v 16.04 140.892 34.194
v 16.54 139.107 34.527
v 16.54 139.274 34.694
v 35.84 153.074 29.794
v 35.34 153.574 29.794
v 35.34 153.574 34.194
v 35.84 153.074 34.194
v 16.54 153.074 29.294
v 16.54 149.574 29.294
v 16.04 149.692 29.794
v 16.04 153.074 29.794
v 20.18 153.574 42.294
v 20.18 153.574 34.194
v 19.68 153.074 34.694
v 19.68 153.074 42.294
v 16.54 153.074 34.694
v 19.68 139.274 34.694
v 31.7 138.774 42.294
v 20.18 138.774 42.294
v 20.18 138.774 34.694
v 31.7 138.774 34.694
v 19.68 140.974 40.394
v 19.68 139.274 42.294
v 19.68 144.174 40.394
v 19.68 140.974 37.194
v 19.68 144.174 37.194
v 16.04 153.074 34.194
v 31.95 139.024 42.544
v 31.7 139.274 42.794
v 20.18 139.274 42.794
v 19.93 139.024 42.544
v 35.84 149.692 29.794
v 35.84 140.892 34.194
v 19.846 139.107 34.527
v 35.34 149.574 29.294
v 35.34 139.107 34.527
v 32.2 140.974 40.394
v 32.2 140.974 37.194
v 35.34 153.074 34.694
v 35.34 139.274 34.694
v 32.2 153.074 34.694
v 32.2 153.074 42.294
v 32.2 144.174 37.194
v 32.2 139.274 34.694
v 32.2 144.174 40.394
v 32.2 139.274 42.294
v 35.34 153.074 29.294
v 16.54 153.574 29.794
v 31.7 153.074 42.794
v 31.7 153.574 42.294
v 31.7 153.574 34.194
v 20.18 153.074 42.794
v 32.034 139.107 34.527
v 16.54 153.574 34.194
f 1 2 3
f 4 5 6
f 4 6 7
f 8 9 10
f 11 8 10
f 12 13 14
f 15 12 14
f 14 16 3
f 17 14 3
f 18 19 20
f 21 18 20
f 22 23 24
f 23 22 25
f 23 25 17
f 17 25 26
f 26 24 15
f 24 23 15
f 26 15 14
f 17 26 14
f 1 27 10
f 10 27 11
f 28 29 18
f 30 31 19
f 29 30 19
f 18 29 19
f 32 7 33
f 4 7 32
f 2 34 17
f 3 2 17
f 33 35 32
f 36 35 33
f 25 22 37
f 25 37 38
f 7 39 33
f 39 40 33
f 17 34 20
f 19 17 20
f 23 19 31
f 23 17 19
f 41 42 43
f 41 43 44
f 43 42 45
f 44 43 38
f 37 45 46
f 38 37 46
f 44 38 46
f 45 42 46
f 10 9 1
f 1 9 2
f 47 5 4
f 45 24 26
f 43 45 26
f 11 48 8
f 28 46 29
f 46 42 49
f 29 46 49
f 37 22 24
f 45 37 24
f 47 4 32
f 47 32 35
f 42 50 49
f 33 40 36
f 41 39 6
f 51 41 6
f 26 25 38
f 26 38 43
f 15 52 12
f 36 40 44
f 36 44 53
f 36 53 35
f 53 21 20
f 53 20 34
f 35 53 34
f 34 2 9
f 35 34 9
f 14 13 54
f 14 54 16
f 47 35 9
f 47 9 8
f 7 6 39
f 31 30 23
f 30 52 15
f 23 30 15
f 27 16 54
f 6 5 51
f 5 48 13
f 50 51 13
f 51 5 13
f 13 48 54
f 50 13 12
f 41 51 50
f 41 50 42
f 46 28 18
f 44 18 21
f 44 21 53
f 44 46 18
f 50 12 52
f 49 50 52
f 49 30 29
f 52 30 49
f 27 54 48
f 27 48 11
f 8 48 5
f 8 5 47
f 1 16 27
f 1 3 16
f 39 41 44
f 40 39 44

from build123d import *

# Parameters (mm, degrees)
BOSS_EXTRUDE1_DEPTH      = 6.260392
BOSS_EXTRUDE1_DEPTH_BACK = 6.260392
SKETCH4_W                = 8.1
SKETCH4_H                = 14.8
SKETCH4_W_2              = 3.2
SKETCH4_H_2              = 3.2
BOSS_EXTRUDE2_DEPTH      = 9.9
BOSS_EXTRUDE2_DEPTH_BACK = 9.9
CHAMFER2_SIZE            = 0.5


with BuildPart() as part:
    # Sketch4 → Boss-Extrude1 (new, two sides: drawn at the far end of the back side and taken through both)
    with BuildSketch(Plane(origin=(25.940071358, 0, 0), x_dir=(0, 0, -1), z_dir=(1, 0, 0)).offset(-BOSS_EXTRUDE1_DEPTH_BACK)):
        with Locations((-38.743556796, 146.174028513)):
            Rectangle(SKETCH4_W, SKETCH4_H)
        with Locations((-38.793556796, 142.574028513)):
            Rectangle(SKETCH4_W_2, SKETCH4_H_2, mode=Mode.SUBTRACT)
    extrude(amount=BOSS_EXTRUDE1_DEPTH + BOSS_EXTRUDE1_DEPTH_BACK)

    # Sketch4<5> → Boss-Extrude2 (add, two sides: drawn at the far end of the back side and taken through both)
    with BuildSketch(Plane(origin=(25.940071358, 0, 0), x_dir=(0, 0, -1), z_dir=(1, 0, 0)).offset(-BOSS_EXTRUDE2_DEPTH_BACK)):
        Polygon((-34.693556796, 153.574028513), (-34.693556796, 138.774028513), (-29.293556796, 149.574028513), (-29.293556796, 153.574028513), align=None)
    extrude(amount=BOSS_EXTRUDE2_DEPTH + BOSS_EXTRUDE2_DEPTH_BACK)

    # Chamfer1
    # the kernel refuses this chamfer: 0.5, 0.372677996 mm, written as the material it takes off along each edge
    with BuildSketch(Plane(origin=(31.867130024, 153.240695179, 42.460223463), x_dir=(0, 0.7071067811865475, -0.7071067811865475), z_dir=(0.5773502691896258, 0.5773502691896258, 0.5773502691896258)), Plane(origin=(35.506738024, 153.240695179, 34.360223463), x_dir=(0, 0.7071067811865475, -0.7071067811865475), z_dir=(0.5773502691896258, 0.5773502691896258, 0.5773502691896258)), Plane(origin=(16.373404691, 153.240695179, 34.360223463), x_dir=(0, -0.7071067811865475, 0.7071067811865475), z_dir=(-0.5773502691896258, 0.5773502691896258, 0.5773502691896258))) as chamfer1_piece_1:
        Polygon((-0.353553391, 0.204124145), (0.353553391, 0.204124145), (0, -0.40824829), align=None)
    extrude(amount=0.635085296, mode=Mode.SUBTRACT)
    with BuildSketch(Plane(origin=(20.013012691, 153.240695179, 42.460223463), x_dir=(0, 0.7071067811865475, -0.7071067811865475), z_dir=(-0.5773502691896258, 0.5773502691896258, 0.5773502691896258)), Plane(origin=(35.506738024, 153.240695179, 29.62689013), x_dir=(0.7071067811865475, -0.7071067811865475, 0), z_dir=(0.5773502691896258, 0.5773502691896258, -0.5773502691896258)), Plane(origin=(16.373404691, 153.240695179, 29.62689013), x_dir=(0, -0.7071067811865475, -0.7071067811865475), z_dir=(-0.5773502691896258, 0.5773502691896258, -0.5773502691896258))) as chamfer1_piece_2:
        Polygon((-0.353553391, -0.204124145), (0.353553391, -0.204124145), (0, 0.40824829), align=None)
    extrude(amount=0.635085296, mode=Mode.SUBTRACT)
    with BuildSketch(Plane(origin=(35.506738024, 139.75781762, 34.471334574), x_dir=(0, -0.7071067811865777, -0.7071067811865174), z_dir=(0.9485360198619486, -0.223918979794528, 0.22391897979454709))) as chamfer1_piece_3:
        Polygon((0.184955718, -0.526311482), (0.420657979, -0.526311482), (-0.605613697, 1.052622965), align=None)
    extrude(amount=0.64485025, mode=Mode.SUBTRACT)
    with BuildSketch(Plane(origin=(16.373404691, 139.75781762, 34.471334574), x_dir=(0, 0.7071067811865777, 0.7071067811865174), z_dir=(-0.9485360198619486, -0.223918979794528, 0.22391897979454709))) as chamfer1_piece_4:
        Polygon((-0.420657979, -0.526311482), (-0.184955718, -0.526311482), (0.605613697, 1.052622965), align=None)
    extrude(amount=0.64485025, mode=Mode.SUBTRACT)
    with BuildSketch(Plane(origin=(18.393837864, 138.774028513, 42.793556796), x_dir=(0, 0.999621916911297, 0.027495876610582292), z_dir=(1, 0, 0))) as chamfer1_piece_5:
        with BuildLine():
            Line((0.514336598, 0), (-0.028273577, -0.513558897))
            Line((-0.028273577, -0.513558897), (-0.038269797, -0.513283938))
            ThreePointArc((-0.038269797, -0.513283938), (-0.017064614, -0.256698915), (-0.009996219, 0.000274959))
            Line((-0.009996219, 0.000274959), (0.000274959, 0.009996219))
            ThreePointArc((0.000274959, 0.009996219), (0.257248832, 0.002927825), (0.514611556, 0.009996219))
            Line((0.514611556, 0.009996219), (0.514336598, 0))
        make_face()
    extrude(amount=15.092466988, mode=Mode.SUBTRACT)
    with BuildSketch(Plane(origin=(33.486304852, 153.574028513, 42.793556796), x_dir=(0, 0.02749587661058229, -0.9996219169112968), z_dir=(-1, 0, 0))) as chamfer1_piece_6:
        with BuildLine():
            Line((0.514336598, 0), (-0.028273577, 0.513558897))
            Line((-0.028273577, 0.513558897), (-0.038269797, 0.513283938))
            ThreePointArc((-0.038269797, 0.513283938), (-0.017064614, 0.256698915), (-0.009996219, -0.000274959))
            Line((-0.009996219, -0.000274959), (0.000274959, -0.009996219))
            ThreePointArc((0.000274959, -0.009996219), (0.257248832, -0.002927825), (0.514611556, -0.009996219))
            Line((0.514611556, -0.009996219), (0.514336598, 0))
        make_face()
    extrude(amount=15.092466988, mode=Mode.SUBTRACT)
    with BuildSketch(Plane(origin=(32.200463358, 154.859870007, 42.793556796), x_dir=(0.02749587661058229, 0, -0.9996219169112968), z_dir=(0, -1, 0)), Plane(origin=(19.679679358, 154.859870007, 42.793556796), x_dir=(0.999621916911297, 0, 0.027495876610582105), z_dir=(0, -1, 0)), Plane(origin=(16.040071358, 154.859870007, 34.693556796), x_dir=(0.999621916911297, 0, 0.027495876610582105), z_dir=(0, -1, 0))) as chamfer1_piece_7:
        with BuildLine():
            Line((0.514336598, 0), (-0.028273577, -0.513558897))
            Line((-0.028273577, -0.513558897), (-0.038269797, -0.513283938))
            ThreePointArc((-0.038269797, -0.513283938), (-0.017064614, -0.256698915), (-0.009996219, 0.000274959))
            Line((-0.009996219, 0.000274959), (0.000274959, 0.009996219))
            ThreePointArc((0.000274959, 0.009996219), (0.257248832, 0.002927825), (0.514611556, 0.009996219))
            Line((0.514611556, 0.009996219), (0.514336598, 0))
        make_face()
    extrude(amount=17.371682988, mode=Mode.SUBTRACT)
    with BuildSketch(Plane(origin=(32.200463358, 153.574028513, 34.693556796), x_dir=(-0.999621916911297, 0.027495876610582105, 0), z_dir=(0, 0, 1))) as chamfer1_piece_8:
        with BuildLine():
            Line((0.514336598, 0), (-0.028273577, 0.513558897))
            Line((-0.028273577, 0.513558897), (-0.038269797, 0.513283938))
            ThreePointArc((-0.038269797, 0.513283938), (-0.017064614, 0.256698915), (-0.009996219, -0.000274959))
            Line((-0.009996219, -0.000274959), (0.000274959, -0.009996219))
            ThreePointArc((0.000274959, -0.009996219), (0.257248832, -0.002927825), (0.514611556, -0.009996219))
            Line((0.514611556, -0.009996219), (0.514336598, 0))
        make_face()
    extrude(amount=9.385841494, mode=Mode.SUBTRACT)
    with BuildSketch(Plane(origin=(19.679679358, 153.574028513, 34.693556796), x_dir=(0.999621916911297, 0.027495876610582105, 0), z_dir=(0, 0, 1))) as chamfer1_piece_9:
        with BuildLine():
            Line((0.514336598, 0), (-0.028273577, -0.513558897))
            Line((-0.028273577, -0.513558897), (-0.038269797, -0.513283938))
            ThreePointArc((-0.038269797, -0.513283938), (-0.017064614, -0.256698915), (-0.009996219, 0.000274959))
            Line((-0.009996219, 0.000274959), (0.000274959, 0.009996219))
            ThreePointArc((0.000274959, 0.009996219), (0.257248832, 0.002927825), (0.514611556, 0.009996219))
            Line((0.514611556, 0.009996219), (0.514336598, 0))
        make_face()
    extrude(amount=9.385841494, mode=Mode.SUBTRACT)
    with BuildSketch(Plane(origin=(37.125912852, 153.574028513, 34.693556796), x_dir=(0, -0.999621916911297, 0.027495876610582292), z_dir=(-1, 0, 0))) as chamfer1_piece_10:
        with BuildLine():
            Line((0.514336598, 0), (-0.028273577, -0.513558897))
            Line((-0.028273577, -0.513558897), (-0.038269797, -0.513283938))
            ThreePointArc((-0.038269797, -0.513283938), (-0.017064614, -0.256698915), (-0.009996219, 0.000274959))
            Line((-0.009996219, 0.000274959), (0.000274959, 0.009996219))
            ThreePointArc((0.000274959, 0.009996219), (0.257248832, 0.002927825), (0.514611556, 0.009996219))
            Line((0.514611556, 0.009996219), (0.514336598, 0))
        make_face()
    extrude(amount=4.925449494, mode=Mode.SUBTRACT)
    with BuildSketch(Plane(origin=(35.840071358, 153.574028513, 28.007715302), x_dir=(-0.999621916911297, 0.027495876610582292, 0), z_dir=(0, 0, 1))) as chamfer1_piece_11:
        with BuildLine():
            Line((0.514336598, 0), (-0.028273577, 0.513558897))
            Line((-0.028273577, 0.513558897), (-0.038269797, 0.513283938))
            ThreePointArc((-0.038269797, 0.513283938), (-0.017064614, 0.256698915), (-0.009996219, -0.000274959))
            Line((-0.009996219, -0.000274959), (0.000274959, -0.009996219))
            ThreePointArc((0.000274959, -0.009996219), (0.257248832, -0.002927825), (0.514611556, -0.009996219))
            Line((0.514611556, -0.009996219), (0.514336598, 0))
        make_face()
    extrude(amount=7.971682988, mode=Mode.SUBTRACT)
    with BuildSketch(Plane(origin=(37.125912852, 153.574028513, 29.293556796), x_dir=(0, 0.027495876610582105, 0.999621916911297), z_dir=(-1, 0, 0))) as chamfer1_piece_12:
        with BuildLine():
            Line((0.514336598, 0), (-0.028273577, -0.513558897))
            Line((-0.028273577, -0.513558897), (-0.038269797, -0.513283938))
            ThreePointArc((-0.038269797, -0.513283938), (-0.017064614, -0.256698915), (-0.009996219, 0.000274959))
            Line((-0.009996219, 0.000274959), (0.000274959, 0.009996219))
            ThreePointArc((0.000274959, 0.009996219), (0.257248832, 0.002927825), (0.514611556, 0.009996219))
            Line((0.514611556, 0.009996219), (0.514336598, 0))
        make_face()
    extrude(amount=22.371682988, mode=Mode.SUBTRACT)
    with BuildSketch(Plane(origin=(16.040071358, 153.574028513, 28.007715302), x_dir=(0.999621916911297, 0.027495876610582105, 0), z_dir=(0, 0, 1))) as chamfer1_piece_13:
        with BuildLine():
            Line((0.514336598, 0), (-0.028273577, -0.513558897))
            Line((-0.028273577, -0.513558897), (-0.038269797, -0.513283938))
            ThreePointArc((-0.038269797, -0.513283938), (-0.017064614, -0.256698915), (-0.009996219, 0.000274959))
            Line((-0.009996219, 0.000274959), (0.000274959, 0.009996219))
            ThreePointArc((0.000274959, 0.009996219), (0.257248832, 0.002927825), (0.514611556, 0.009996219))
            Line((0.514611556, 0.009996219), (0.514336598, 0))
        make_face()
    extrude(amount=7.971682988, mode=Mode.SUBTRACT)
    with BuildSketch(Plane(origin=(35.840071358, 148.288187019, 29.293556796), x_dir=(0.027495876610582105, 0, 0.999621916911297), z_dir=(0, 1, 0)), Plane(origin=(16.040071358, 148.288187019, 29.293556796), x_dir=(0.9996219169112968, 0, -0.027495876610589005), z_dir=(0, 1, 0))) as chamfer1_piece_14:
        with BuildLine():
            Line((0.514336598, 0), (-0.028273577, -0.513558897))
            Line((-0.028273577, -0.513558897), (-0.038269797, -0.513283938))
            ThreePointArc((-0.038269797, -0.513283938), (-0.017064614, -0.256698915), (-0.009996219, 0.000274959))
            Line((-0.009996219, 0.000274959), (0.000274959, 0.009996219))
            ThreePointArc((0.000274959, 0.009996219), (0.257248832, 0.002927825), (0.514611556, 0.009996219))
            Line((0.514611556, 0.009996219), (0.514336598, 0))
        make_face()
    extrude(amount=6.571682988, mode=Mode.SUBTRACT)
    with BuildSketch(Plane(origin=(35.840071358, 137.623936917, 35.268602594), x_dir=(-0.999621916911297, -0.012296529840442863, -0.024593059680883298), z_dir=(0, 0.8944271909998982, -0.44721359549999323))) as chamfer1_piece_15:
        with BuildLine():
            Line((0.514336598, 0), (-0.028273577, 0.513558897))
            Line((-0.028273577, 0.513558897), (-0.038269797, 0.513283938))
            ThreePointArc((-0.038269797, 0.513283938), (-0.017064614, 0.256698915), (-0.009996219, -0.000274959))
            Line((-0.009996219, -0.000274959), (0.000274959, -0.009996219))
            ThreePointArc((0.000274959, -0.009996219), (0.257248832, -0.002927825), (0.514611556, -0.009996219))
            Line((0.514611556, -0.009996219), (0.514336598, 0))
        make_face()
    extrude(amount=14.646450066, mode=Mode.SUBTRACT)
    with BuildSketch(Plane(origin=(16.040071358, 137.623936917, 35.268602594), x_dir=(0.999621916911297, -0.012296529840442778, -0.024593059680883128), z_dir=(0, 0.8944271909998982, -0.44721359549999323))) as chamfer1_piece_16:
        with BuildLine():
            Line((0.514336598, 0), (-0.028273577, -0.513558897))
            Line((-0.028273577, -0.513558897), (-0.038269797, -0.513283938))
            ThreePointArc((-0.038269797, -0.513283938), (-0.017064614, -0.256698915), (-0.009996219, 0.000274959))
            Line((-0.009996219, 0.000274959), (0.000274959, 0.009996219))
            ThreePointArc((0.000274959, 0.009996219), (0.257248832, 0.002927825), (0.514611556, 0.009996219))
            Line((0.514611556, 0.009996219), (0.514336598, 0))
        make_face()
    extrude(amount=14.646450066, mode=Mode.SUBTRACT)
    with BuildSketch(Plane(origin=(19.679679358, 153.574028513, 34.693556796), x_dir=(0, 0.02749587661058229, -0.9996219169112968), z_dir=(-1, 0, 0))) as chamfer1_piece_17:
        with BuildLine():
            Line((0.514336598, 0), (-0.028273577, 0.513558897))
            Line((-0.028273577, 0.513558897), (-0.038269797, 0.513283938))
            ThreePointArc((-0.038269797, 0.513283938), (-0.017064614, 0.256698915), (-0.009996219, -0.000274959))
            Line((-0.009996219, -0.000274959), (0.000274959, -0.009996219))
            ThreePointArc((0.000274959, -0.009996219), (0.257248832, -0.002927825), (0.514611556, -0.009996219))
            Line((0.514611556, -0.009996219), (0.514336598, 0))
        make_face()
    extrude(amount=4.925449494, mode=Mode.SUBTRACT)
    with BuildSketch(Plane(origin=(35.840071358, 154.859870007, 34.693556796), x_dir=(-0.999621916911297, 0, 0.027495876610582292), z_dir=(0, -1, 0))) as chamfer1_piece_18:
        with BuildLine():
            Line((0.514336598, 0), (-0.028273577, 0.513558897))
            Line((-0.028273577, 0.513558897), (-0.038269797, 0.513283938))
            ThreePointArc((-0.038269797, 0.513283938), (-0.017064614, 0.256698915), (-0.009996219, -0.000274959))
            Line((-0.009996219, -0.000274959), (0.000274959, -0.009996219))
            ThreePointArc((0.000274959, -0.009996219), (0.257248832, -0.002927825), (0.514611556, -0.009996219))
            Line((0.514611556, -0.009996219), (0.514336598, 0))
        make_face()
    extrude(amount=17.371682988, mode=Mode.SUBTRACT)
    with BuildSketch(Plane(origin=(32.200463358, 138.774028513, 34.693556796), x_dir=(0, 0.999621916911297, 0.027495876610582292), z_dir=(1, 0, 0))) as chamfer1_piece_19:
        with BuildLine():
            Line((0.514336598, 0), (0.31409902, -0.189516883))
            Line((0.31409902, -0.189516883), (0.309382645, -0.198334808))
            ThreePointArc((0.309382645, -0.198334808), (0.156807481, -0.095210948), (-0.004716376, -0.008817925))
            Line((-0.004716376, -0.008817925), (0.000274959, 0.009996219))
            ThreePointArc((0.000274959, 0.009996219), (0.257248832, 0.002927825), (0.514611556, 0.009996219))
            Line((0.514611556, 0.009996219), (0.514336598, 0))
        make_face()
    extrude(amount=4.925449494, mode=Mode.SUBTRACT)
    with BuildSketch(Plane(origin=(14.754229864, 138.774028513, 34.693556796), x_dir=(0, 0.8700995906888151, -0.492875950197569), z_dir=(1, 0, 0))) as chamfer1_piece_20:
        with BuildLine():
            Line((0.366844441, 0), (0.440384543, 0.26571336))
            Line((0.440384543, 0.26571336), (0.435455784, 0.274414356))
            ThreePointArc((0.435455784, 0.274414356), (0.218748671, 0.135405143), (-0.00492876, 0.008700996))
            Line((-0.00492876, 0.008700996), (0.000517213, -0.009986616))
            ThreePointArc((0.000517213, -0.009986616), (0.183448762, -0.00051248), (0.367361654, -0.009986616))
            Line((0.367361654, -0.009986616), (0.366844441, 0))
        make_face()
    extrude(amount=4.925449494, mode=Mode.SUBTRACT)
    with BuildSketch(Plane(origin=(37.125912852, 153.574028513, 34.693556796), x_dir=(0, -0.999621916911297, 0.027495876610582292), z_dir=(-1, 0, 0))) as chamfer1_piece_21a_section:
        with BuildLine():
            Line((0.514336598, 0), (-0.028273577, -0.513558897))
            Line((-0.028273577, -0.513558897), (-0.038269797, -0.513283938))
            ThreePointArc((-0.038269797, -0.513283938), (-0.017064614, -0.256698915), (-0.009996219, 0.000274959))
            Line((-0.009996219, 0.000274959), (0.000274959, 0.009996219))
            ThreePointArc((0.000274959, 0.009996219), (0.257248832, 0.002927825), (0.514611556, 0.009996219))
            Line((0.514611556, 0.009996219), (0.514336598, 0))
        make_face()
    chamfer1_piece_21a = extrude(amount=6.211290988, mode=Mode.PRIVATE)
    chamfer1_piece_21a = split(chamfer1_piece_21a, bisect_by=Plane(origin=(32.200463358, 153.409131699, 34.528659983), z_dir=(-1, 0, 0)), keep=Keep.TOP, mode=Mode.PRIVATE)
    with BuildSketch(Plane(origin=(32.200463358, 153.574028513, 33.407715302), x_dir=(-0.999621916911297, 0.027495876610582105, 0), z_dir=(0, 0, 1))) as chamfer1_piece_21b_section:
        with BuildLine():
            Line((0.514336598, 0), (-0.028273577, 0.513558897))
            Line((-0.028273577, 0.513558897), (-0.038269797, 0.513283938))
            ThreePointArc((-0.038269797, 0.513283938), (-0.017064614, 0.256698915), (-0.009996219, -0.000274959))
            Line((-0.009996219, -0.000274959), (0.000274959, -0.009996219))
            ThreePointArc((0.000274959, -0.009996219), (0.257248832, -0.002927825), (0.514611556, -0.009996219))
            Line((0.514611556, -0.009996219), (0.514336598, 0))
        make_face()
    chamfer1_piece_21b = extrude(amount=10.671682988, mode=Mode.PRIVATE)
    chamfer1_piece_21b = split(chamfer1_piece_21b, bisect_by=Plane(origin=(32.035566544, 153.409131699, 34.693556796), z_dir=(0, 0, -1)), keep=Keep.TOP, mode=Mode.PRIVATE)
    chamfer1_piece_21 = chamfer1_piece_21a & chamfer1_piece_21b
    add(chamfer1_piece_21, mode=Mode.SUBTRACT)
    with BuildSketch(Plane(origin=(19.679679358, 153.574028513, 33.407715302), x_dir=(0.999621916911297, 0.027495876610582105, 0), z_dir=(0, 0, 1))) as chamfer1_piece_22a_section:
        with BuildLine():
            Line((0.514336598, 0), (-0.028273577, -0.513558897))
            Line((-0.028273577, -0.513558897), (-0.038269797, -0.513283938))
            ThreePointArc((-0.038269797, -0.513283938), (-0.017064614, -0.256698915), (-0.009996219, 0.000274959))
            Line((-0.009996219, 0.000274959), (0.000274959, 0.009996219))
            ThreePointArc((0.000274959, 0.009996219), (0.257248832, 0.002927825), (0.514611556, 0.009996219))
            Line((0.514611556, 0.009996219), (0.514336598, 0))
        make_face()
    chamfer1_piece_22a = extrude(amount=10.671682988, mode=Mode.PRIVATE)
    chamfer1_piece_22a = split(chamfer1_piece_22a, bisect_by=Plane(origin=(19.844576171, 153.409131699, 34.693556796), z_dir=(0, 0, -1)), keep=Keep.TOP, mode=Mode.PRIVATE)
    with BuildSketch(Plane(origin=(20.965520852, 153.574028513, 34.693556796), x_dir=(0, 0.02749587661058229, -0.9996219169112968), z_dir=(-1, 0, 0))) as chamfer1_piece_22b_section:
        with BuildLine():
            Line((0.514336598, 0), (-0.028273577, 0.513558897))
            Line((-0.028273577, 0.513558897), (-0.038269797, 0.513283938))
            ThreePointArc((-0.038269797, 0.513283938), (-0.017064614, 0.256698915), (-0.009996219, -0.000274959))
            Line((-0.009996219, -0.000274959), (0.000274959, -0.009996219))
            ThreePointArc((0.000274959, -0.009996219), (0.257248832, -0.002927825), (0.514611556, -0.009996219))
            Line((0.514611556, -0.009996219), (0.514336598, 0))
        make_face()
    chamfer1_piece_22b = extrude(amount=6.211290988, mode=Mode.PRIVATE)
    chamfer1_piece_22b = split(chamfer1_piece_22b, bisect_by=Plane(origin=(19.679679358, 153.409131699, 34.528659983), z_dir=(1, 0, 0)), keep=Keep.TOP, mode=Mode.PRIVATE)
    chamfer1_piece_22 = chamfer1_piece_22a & chamfer1_piece_22b
    add(chamfer1_piece_22, mode=Mode.SUBTRACT)

    # Chamfer2
    chamfer2_edges = [part.edges().sort_by_distance(p)[0] for p in [
        (32.200463358, 138.774028513, 38.493556796),
        (19.679679358, 138.774028513, 38.493556796),
    ]]
    chamfer(chamfer2_edges, length=CHAMFER2_SIZE)


solid = part.part
